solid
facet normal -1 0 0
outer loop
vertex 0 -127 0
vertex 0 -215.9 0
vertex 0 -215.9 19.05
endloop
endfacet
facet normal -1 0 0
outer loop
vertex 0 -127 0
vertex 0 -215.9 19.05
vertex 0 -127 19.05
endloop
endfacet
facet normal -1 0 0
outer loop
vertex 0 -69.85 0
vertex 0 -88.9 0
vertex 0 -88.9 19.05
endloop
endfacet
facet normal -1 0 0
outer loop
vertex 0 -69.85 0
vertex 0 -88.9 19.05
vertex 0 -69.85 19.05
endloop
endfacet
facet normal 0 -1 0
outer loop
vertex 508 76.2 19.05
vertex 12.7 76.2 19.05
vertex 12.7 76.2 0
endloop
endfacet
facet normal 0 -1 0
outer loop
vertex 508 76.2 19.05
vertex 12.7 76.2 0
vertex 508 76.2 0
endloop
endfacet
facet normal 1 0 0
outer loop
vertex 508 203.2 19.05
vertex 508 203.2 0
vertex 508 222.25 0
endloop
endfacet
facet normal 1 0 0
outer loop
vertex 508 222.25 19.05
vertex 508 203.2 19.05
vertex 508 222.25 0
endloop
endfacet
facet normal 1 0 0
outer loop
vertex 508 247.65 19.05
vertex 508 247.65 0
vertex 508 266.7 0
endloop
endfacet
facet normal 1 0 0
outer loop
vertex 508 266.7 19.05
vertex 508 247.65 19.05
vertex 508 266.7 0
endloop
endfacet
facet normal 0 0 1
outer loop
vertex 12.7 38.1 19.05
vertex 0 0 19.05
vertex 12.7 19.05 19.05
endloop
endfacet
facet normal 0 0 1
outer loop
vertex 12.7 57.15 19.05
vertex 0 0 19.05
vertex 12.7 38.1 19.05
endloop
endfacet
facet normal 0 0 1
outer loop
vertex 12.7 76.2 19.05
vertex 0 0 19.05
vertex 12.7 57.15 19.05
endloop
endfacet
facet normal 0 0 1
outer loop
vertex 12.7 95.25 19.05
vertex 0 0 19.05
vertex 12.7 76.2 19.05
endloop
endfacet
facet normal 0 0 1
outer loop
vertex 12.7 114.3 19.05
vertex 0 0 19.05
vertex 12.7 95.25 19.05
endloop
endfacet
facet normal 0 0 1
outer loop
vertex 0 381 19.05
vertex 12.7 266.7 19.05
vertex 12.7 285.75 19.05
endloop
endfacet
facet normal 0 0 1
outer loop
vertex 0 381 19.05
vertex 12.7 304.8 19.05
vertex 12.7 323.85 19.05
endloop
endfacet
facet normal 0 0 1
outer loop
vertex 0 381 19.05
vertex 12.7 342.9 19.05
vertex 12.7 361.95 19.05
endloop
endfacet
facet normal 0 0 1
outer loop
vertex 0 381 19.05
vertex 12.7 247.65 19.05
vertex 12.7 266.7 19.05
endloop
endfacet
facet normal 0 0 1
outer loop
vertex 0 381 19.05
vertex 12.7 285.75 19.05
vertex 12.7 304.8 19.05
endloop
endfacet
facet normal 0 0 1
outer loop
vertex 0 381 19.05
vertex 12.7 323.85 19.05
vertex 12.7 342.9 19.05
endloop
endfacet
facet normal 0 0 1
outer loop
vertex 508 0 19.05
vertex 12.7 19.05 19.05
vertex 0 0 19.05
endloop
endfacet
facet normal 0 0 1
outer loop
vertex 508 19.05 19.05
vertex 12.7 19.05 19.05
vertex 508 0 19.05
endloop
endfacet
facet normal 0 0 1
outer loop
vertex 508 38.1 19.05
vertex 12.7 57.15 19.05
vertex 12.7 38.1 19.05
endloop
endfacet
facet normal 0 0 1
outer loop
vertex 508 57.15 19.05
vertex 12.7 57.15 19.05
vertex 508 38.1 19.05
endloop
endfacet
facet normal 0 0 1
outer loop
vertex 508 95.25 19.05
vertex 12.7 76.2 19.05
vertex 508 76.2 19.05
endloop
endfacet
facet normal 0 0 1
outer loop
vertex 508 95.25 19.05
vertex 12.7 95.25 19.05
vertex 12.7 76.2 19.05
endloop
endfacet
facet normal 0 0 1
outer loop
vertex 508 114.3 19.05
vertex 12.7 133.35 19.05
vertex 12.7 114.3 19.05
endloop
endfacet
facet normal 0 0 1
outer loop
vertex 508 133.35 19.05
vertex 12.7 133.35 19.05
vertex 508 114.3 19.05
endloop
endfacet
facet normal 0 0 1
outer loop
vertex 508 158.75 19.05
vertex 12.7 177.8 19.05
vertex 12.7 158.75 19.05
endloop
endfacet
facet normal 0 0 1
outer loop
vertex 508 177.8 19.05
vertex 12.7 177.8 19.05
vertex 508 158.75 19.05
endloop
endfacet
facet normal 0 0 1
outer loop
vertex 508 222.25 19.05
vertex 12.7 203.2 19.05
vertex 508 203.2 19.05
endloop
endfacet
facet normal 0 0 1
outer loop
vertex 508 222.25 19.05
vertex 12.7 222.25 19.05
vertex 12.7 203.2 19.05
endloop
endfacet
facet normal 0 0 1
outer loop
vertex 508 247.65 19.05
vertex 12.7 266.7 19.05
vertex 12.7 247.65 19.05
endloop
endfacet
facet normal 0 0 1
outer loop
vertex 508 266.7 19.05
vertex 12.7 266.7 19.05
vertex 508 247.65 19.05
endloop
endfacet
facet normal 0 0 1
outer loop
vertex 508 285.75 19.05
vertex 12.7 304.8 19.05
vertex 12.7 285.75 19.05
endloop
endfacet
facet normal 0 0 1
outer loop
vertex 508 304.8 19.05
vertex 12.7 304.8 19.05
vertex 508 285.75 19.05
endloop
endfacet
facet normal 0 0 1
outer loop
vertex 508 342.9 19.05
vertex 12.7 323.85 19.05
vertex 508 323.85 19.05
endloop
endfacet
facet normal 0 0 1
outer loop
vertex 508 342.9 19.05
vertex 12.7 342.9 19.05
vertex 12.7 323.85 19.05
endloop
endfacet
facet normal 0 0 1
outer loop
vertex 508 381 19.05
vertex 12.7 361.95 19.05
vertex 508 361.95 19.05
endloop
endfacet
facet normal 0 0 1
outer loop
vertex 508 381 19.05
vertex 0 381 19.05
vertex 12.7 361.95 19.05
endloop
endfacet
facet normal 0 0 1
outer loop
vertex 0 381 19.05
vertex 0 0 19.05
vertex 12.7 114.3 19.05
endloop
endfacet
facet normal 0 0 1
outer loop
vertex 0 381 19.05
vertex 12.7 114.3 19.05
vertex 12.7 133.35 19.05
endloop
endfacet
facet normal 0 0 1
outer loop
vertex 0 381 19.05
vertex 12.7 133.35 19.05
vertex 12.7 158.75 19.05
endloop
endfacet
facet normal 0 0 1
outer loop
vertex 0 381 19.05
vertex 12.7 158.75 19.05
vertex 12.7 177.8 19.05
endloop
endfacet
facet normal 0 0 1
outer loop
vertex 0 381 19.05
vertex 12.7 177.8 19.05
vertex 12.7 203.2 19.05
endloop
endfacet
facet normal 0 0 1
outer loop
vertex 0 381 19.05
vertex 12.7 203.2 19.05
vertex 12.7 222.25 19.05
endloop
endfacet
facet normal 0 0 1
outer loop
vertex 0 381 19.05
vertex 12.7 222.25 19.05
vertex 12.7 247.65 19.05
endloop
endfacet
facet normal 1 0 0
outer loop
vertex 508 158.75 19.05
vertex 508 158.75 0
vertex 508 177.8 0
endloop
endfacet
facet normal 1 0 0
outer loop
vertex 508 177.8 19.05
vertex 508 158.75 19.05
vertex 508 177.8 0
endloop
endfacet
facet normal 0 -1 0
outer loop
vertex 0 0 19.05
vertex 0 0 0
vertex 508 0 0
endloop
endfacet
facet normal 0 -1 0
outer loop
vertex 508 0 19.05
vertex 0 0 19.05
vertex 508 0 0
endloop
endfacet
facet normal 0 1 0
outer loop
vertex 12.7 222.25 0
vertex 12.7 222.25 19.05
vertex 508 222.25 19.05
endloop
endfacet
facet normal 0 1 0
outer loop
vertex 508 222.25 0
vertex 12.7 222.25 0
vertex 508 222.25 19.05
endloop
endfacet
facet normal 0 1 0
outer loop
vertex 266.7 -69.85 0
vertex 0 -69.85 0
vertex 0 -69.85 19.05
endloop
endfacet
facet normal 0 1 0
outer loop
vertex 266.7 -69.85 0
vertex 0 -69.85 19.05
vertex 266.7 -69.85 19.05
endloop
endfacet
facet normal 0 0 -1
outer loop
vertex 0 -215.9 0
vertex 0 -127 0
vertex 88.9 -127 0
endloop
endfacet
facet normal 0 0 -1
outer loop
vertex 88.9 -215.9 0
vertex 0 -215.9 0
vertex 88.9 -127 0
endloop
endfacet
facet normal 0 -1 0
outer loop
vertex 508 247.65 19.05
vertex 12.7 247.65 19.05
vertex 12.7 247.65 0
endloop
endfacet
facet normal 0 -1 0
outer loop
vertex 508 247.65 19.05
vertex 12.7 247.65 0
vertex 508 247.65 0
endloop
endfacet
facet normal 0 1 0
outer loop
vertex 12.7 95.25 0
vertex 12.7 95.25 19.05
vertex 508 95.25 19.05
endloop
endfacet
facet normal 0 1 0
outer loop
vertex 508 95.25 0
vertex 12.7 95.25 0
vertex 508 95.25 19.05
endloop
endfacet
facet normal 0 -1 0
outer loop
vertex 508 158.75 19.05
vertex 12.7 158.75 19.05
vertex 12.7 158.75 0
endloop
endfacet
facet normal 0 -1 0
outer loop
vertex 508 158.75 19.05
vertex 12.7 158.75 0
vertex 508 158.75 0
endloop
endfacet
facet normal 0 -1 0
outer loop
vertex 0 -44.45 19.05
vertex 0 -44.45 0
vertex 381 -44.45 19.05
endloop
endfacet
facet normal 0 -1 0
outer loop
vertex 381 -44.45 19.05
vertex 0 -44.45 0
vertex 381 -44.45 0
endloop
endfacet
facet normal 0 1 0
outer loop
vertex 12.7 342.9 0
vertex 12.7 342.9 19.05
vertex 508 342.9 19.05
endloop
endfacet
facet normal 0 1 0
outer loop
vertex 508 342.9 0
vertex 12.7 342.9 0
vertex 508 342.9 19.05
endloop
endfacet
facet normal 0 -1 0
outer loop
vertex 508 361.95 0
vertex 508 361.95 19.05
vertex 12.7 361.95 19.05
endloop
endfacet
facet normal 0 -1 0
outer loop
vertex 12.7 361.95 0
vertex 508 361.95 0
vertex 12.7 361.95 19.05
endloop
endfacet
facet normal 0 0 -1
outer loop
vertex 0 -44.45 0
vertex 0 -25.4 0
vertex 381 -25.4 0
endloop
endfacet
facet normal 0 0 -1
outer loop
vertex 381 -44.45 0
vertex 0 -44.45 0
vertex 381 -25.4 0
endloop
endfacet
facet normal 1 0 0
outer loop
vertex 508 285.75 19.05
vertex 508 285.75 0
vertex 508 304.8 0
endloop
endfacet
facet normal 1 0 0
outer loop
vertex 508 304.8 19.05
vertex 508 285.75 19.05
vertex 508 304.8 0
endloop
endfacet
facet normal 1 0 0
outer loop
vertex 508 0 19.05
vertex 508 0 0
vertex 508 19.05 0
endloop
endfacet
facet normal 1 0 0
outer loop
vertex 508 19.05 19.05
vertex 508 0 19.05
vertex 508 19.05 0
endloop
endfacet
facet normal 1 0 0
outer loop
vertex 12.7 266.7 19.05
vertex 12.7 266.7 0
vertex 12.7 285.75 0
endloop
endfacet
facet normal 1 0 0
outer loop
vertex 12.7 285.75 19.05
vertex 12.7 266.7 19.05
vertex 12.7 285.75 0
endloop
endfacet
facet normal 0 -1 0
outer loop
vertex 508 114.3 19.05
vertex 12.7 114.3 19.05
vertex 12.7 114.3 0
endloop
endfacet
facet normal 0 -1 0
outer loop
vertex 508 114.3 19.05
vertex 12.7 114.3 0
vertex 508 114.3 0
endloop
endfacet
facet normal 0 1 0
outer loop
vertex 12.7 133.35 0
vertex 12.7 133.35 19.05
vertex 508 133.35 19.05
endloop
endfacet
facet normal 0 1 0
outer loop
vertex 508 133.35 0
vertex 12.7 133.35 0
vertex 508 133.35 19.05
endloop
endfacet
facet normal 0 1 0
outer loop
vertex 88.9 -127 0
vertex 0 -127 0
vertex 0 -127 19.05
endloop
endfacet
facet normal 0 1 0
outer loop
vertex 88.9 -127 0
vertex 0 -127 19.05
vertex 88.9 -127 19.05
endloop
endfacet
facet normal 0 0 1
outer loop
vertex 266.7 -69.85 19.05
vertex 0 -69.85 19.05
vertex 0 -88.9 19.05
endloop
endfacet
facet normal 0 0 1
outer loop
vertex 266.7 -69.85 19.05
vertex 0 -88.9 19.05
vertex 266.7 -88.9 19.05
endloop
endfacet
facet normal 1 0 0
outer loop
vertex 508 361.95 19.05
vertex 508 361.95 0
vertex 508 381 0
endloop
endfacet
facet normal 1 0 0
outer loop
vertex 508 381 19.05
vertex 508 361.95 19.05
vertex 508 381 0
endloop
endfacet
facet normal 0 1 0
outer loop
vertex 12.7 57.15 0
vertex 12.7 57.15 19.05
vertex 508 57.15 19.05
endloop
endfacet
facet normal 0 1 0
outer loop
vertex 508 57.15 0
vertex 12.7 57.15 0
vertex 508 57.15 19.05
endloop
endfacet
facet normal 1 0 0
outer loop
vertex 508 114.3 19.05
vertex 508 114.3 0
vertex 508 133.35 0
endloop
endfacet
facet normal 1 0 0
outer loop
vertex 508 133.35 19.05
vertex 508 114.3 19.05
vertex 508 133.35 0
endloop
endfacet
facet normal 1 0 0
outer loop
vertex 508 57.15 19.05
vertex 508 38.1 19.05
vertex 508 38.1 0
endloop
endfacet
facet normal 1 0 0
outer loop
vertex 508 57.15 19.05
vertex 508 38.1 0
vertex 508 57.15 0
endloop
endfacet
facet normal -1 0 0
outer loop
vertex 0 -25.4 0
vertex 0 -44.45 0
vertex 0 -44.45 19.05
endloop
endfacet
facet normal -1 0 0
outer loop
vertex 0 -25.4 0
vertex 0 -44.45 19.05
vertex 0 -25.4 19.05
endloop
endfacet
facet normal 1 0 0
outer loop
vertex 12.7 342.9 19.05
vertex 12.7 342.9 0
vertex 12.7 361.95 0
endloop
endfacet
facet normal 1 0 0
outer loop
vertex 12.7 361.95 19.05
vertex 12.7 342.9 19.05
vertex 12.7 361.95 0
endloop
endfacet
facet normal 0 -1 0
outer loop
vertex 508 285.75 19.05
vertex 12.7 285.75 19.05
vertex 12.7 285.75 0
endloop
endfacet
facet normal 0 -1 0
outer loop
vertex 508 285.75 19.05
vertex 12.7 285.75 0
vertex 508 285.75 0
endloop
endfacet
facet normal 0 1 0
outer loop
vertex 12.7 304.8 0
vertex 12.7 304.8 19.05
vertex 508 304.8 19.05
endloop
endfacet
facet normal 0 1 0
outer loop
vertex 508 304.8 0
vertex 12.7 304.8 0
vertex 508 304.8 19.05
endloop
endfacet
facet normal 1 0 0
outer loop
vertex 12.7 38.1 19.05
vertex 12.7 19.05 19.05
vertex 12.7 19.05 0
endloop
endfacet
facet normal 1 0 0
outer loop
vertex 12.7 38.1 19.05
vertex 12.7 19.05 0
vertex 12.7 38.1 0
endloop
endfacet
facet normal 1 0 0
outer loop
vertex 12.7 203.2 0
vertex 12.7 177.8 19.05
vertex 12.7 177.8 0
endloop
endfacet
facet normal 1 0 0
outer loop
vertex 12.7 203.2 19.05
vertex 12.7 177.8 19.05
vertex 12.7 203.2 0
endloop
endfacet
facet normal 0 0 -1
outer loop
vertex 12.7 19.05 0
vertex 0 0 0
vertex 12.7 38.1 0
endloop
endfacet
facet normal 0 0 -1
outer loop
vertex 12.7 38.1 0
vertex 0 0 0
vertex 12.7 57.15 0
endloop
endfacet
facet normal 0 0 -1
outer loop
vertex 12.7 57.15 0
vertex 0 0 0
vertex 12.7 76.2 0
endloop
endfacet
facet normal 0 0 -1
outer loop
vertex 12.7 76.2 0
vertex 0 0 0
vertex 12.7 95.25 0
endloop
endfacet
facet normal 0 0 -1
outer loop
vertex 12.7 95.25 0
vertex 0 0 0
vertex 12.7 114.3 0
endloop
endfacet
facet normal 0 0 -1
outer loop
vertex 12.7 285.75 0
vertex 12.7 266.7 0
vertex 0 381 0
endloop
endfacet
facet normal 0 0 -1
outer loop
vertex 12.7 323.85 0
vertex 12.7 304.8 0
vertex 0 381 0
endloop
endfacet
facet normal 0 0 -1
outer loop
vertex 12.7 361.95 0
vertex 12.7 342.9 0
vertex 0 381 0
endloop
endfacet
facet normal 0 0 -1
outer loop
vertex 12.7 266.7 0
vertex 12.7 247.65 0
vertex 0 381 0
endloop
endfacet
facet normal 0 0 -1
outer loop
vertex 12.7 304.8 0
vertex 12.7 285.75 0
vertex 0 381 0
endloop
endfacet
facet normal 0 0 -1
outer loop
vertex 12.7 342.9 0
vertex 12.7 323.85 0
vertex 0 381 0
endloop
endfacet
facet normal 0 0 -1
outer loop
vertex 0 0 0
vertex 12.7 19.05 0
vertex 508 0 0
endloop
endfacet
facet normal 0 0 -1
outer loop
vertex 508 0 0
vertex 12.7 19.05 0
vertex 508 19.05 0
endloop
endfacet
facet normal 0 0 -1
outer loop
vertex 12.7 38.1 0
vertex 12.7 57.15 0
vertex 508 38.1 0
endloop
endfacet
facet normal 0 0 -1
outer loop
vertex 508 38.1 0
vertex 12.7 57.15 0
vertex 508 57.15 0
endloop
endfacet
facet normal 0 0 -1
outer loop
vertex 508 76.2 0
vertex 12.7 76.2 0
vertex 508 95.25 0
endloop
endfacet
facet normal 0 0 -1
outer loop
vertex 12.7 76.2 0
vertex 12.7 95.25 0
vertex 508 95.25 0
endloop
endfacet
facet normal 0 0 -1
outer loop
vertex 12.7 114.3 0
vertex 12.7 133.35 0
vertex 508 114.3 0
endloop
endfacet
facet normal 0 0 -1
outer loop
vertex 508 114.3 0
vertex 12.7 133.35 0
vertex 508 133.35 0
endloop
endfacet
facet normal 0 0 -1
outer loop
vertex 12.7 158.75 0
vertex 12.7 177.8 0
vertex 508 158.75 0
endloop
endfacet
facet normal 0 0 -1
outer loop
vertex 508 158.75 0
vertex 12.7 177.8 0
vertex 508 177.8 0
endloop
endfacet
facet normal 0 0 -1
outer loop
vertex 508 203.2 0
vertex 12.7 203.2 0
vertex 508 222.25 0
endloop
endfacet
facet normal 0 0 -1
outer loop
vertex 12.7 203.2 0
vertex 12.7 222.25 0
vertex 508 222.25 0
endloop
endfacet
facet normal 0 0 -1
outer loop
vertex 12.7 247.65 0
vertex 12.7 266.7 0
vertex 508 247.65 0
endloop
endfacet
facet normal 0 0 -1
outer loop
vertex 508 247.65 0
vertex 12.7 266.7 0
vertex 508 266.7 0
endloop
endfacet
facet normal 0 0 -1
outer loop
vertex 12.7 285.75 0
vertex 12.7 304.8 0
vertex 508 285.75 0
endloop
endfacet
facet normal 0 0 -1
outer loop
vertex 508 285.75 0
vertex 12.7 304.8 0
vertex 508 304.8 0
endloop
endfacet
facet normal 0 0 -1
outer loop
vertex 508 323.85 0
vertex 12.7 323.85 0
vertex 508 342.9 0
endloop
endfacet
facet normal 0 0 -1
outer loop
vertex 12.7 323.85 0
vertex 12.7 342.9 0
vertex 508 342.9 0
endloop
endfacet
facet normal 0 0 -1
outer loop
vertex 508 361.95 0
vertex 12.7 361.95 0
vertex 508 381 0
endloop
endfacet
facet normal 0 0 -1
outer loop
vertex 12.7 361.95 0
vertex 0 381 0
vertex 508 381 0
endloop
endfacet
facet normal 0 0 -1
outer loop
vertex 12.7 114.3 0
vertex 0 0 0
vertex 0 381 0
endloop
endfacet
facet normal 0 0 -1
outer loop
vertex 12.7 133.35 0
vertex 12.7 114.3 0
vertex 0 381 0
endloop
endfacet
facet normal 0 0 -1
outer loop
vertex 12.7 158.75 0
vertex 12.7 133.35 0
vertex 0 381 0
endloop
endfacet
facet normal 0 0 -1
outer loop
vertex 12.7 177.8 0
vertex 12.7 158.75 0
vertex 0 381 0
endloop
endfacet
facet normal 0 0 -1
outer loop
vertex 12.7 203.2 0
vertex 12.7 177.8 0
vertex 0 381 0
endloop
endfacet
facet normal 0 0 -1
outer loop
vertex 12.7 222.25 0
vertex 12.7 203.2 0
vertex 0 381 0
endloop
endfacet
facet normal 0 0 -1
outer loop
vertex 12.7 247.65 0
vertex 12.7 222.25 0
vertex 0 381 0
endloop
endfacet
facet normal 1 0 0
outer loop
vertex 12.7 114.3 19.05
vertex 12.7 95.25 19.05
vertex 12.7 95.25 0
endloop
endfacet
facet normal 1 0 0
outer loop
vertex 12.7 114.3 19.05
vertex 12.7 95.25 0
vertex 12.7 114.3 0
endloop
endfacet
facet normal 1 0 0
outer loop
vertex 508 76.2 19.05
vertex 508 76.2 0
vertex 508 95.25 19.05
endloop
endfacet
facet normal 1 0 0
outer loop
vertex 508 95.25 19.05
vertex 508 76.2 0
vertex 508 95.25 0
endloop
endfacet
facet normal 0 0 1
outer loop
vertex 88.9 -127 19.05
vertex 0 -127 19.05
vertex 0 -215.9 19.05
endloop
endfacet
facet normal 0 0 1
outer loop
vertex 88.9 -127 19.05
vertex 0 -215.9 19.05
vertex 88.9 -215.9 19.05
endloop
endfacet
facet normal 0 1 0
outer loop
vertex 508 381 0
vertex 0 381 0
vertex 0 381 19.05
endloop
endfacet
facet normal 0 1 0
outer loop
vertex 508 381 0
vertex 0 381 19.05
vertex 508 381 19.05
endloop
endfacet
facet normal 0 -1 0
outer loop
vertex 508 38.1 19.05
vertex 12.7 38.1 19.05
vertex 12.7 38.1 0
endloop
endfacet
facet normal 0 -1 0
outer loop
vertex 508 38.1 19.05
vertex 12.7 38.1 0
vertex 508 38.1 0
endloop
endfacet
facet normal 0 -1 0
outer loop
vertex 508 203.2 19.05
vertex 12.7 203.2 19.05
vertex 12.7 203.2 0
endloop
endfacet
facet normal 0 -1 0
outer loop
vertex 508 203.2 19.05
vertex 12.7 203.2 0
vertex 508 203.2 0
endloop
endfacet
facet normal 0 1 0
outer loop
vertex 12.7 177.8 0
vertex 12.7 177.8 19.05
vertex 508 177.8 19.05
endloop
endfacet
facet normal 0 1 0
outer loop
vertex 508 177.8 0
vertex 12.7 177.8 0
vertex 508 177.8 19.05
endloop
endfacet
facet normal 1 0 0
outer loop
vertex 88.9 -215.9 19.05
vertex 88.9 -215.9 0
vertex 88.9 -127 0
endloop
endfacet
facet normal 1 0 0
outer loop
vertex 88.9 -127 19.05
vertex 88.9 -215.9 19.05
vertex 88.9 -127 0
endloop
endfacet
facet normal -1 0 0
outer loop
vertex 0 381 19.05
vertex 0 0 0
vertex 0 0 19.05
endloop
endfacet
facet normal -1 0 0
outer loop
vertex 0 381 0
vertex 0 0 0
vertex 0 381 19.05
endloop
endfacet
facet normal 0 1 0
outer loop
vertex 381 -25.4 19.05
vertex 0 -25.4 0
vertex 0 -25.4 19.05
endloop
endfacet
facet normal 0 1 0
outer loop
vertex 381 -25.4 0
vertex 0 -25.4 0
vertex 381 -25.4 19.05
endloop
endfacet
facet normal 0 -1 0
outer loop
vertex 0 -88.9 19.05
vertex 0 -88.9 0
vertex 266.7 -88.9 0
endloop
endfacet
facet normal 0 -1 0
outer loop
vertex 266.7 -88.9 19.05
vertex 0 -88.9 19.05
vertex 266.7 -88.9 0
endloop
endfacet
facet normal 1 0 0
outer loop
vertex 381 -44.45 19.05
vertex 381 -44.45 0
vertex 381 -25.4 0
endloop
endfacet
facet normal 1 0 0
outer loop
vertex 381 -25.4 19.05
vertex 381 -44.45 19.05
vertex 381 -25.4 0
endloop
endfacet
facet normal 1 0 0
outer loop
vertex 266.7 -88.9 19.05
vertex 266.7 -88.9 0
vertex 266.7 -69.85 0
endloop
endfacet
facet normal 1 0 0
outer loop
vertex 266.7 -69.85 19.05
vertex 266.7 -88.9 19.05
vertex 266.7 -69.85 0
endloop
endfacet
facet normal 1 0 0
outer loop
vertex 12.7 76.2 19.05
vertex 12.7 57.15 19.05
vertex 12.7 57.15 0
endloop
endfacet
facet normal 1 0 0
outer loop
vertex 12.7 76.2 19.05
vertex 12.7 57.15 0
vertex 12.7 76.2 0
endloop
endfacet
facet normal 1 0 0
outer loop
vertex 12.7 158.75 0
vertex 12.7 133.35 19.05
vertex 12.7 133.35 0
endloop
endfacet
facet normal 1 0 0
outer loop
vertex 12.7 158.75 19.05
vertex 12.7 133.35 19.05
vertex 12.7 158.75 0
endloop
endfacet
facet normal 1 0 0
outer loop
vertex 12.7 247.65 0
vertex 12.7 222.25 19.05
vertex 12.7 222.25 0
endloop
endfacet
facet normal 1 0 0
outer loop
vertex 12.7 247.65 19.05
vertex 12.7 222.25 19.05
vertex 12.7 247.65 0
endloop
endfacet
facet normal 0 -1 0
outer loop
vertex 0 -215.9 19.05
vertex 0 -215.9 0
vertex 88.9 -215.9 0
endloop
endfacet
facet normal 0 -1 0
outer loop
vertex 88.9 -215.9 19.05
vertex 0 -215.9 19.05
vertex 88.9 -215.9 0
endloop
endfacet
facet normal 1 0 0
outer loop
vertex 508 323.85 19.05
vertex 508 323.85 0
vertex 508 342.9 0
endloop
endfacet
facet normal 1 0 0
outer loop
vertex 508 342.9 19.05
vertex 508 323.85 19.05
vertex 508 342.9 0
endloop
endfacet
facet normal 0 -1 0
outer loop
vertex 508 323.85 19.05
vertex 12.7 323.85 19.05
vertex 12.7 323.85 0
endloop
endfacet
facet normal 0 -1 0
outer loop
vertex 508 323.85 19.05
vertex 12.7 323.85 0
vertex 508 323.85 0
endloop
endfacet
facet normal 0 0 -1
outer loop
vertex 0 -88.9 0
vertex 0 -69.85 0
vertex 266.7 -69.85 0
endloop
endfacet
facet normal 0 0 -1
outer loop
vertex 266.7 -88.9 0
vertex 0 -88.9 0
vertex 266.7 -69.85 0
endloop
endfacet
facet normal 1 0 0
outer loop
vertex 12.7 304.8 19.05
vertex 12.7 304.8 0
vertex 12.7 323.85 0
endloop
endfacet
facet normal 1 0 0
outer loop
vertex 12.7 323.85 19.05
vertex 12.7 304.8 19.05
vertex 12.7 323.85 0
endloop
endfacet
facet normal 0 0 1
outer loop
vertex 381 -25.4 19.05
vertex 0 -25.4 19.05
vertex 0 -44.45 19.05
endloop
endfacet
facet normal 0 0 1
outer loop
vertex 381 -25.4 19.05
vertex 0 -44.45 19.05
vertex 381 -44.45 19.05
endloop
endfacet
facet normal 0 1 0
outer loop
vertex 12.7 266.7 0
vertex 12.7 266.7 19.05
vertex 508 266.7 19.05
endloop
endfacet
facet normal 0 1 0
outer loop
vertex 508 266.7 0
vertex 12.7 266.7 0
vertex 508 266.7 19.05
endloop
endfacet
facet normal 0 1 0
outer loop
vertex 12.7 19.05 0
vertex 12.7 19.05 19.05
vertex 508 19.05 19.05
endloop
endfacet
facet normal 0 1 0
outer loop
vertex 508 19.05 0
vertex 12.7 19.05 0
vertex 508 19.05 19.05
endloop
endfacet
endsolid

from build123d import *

# Parameters (mm, degrees)
F0_W     = 508
F0_H     = 381
F1_DEPTH = 19.05
F2_W     = 495.3
F2_H     = 19.05
F2_H_2   = 25.4
F2_W_2   = 482.6
F2_W_3   = 12.7
F3_DEPTH = 25.4
F4_W     = 381
F4_H     = 19.05
F4_W_2   = 266.7
F4_W_3   = 88.9
F4_H_2   = 88.9
F5_DEPTH = 19.05


with BuildPart() as f1:
    # F0 (on Top) → F1 (new body)
    with BuildSketch(Plane.XY):
        with Locations((254, 190.5)):
            Rectangle(F0_W, F0_H)
    extrude(amount=F1_DEPTH)

    # F2 (on face) → F3 (cut)
    with BuildSketch(Plane.XY.offset(19.05)):
        with Locations((260.35, 28.575)):
            Rectangle(F2_W, F2_H)
        with Locations((260.35, 66.675)):
            Rectangle(F2_W, F2_H)
        with Locations((260.35, 104.775)):
            Rectangle(F2_W, F2_H)
        with Locations((260.35, 146.05)):
            Rectangle(F2_W, F2_H_2)
        with Locations((260.35, 190.5)):
            Rectangle(F2_W, F2_H_2)
        with Locations((260.35, 234.95)):
            Rectangle(F2_W, F2_H_2)
        with Locations((260.35, 276.225)):
            Rectangle(F2_W, F2_H)
        with Locations((260.35, 314.325)):
            Rectangle(F2_W, F2_H)
        with Locations((254, 352.425)):
            Rectangle(F2_W_2, F2_H)
        with Locations((501.65, 352.425)):
            Rectangle(F2_W_3, F2_H)
    extrude(amount=-F3_DEPTH, mode=Mode.SUBTRACT)


with BuildPart() as f5:
    # F4 (on Top) → F5 (new body)
    with BuildSketch(Plane.XY):
        with Locations((190.5, -34.925)):
            Rectangle(F4_W, F4_H)
        with Locations((133.35, -79.375)):
            Rectangle(F4_W_2, F4_H)
        with Locations((44.45, -171.45)):
            Rectangle(F4_W_3, F4_H_2)
    extrude(amount=F5_DEPTH)


solid = Compound([f1.part, f5.part])
